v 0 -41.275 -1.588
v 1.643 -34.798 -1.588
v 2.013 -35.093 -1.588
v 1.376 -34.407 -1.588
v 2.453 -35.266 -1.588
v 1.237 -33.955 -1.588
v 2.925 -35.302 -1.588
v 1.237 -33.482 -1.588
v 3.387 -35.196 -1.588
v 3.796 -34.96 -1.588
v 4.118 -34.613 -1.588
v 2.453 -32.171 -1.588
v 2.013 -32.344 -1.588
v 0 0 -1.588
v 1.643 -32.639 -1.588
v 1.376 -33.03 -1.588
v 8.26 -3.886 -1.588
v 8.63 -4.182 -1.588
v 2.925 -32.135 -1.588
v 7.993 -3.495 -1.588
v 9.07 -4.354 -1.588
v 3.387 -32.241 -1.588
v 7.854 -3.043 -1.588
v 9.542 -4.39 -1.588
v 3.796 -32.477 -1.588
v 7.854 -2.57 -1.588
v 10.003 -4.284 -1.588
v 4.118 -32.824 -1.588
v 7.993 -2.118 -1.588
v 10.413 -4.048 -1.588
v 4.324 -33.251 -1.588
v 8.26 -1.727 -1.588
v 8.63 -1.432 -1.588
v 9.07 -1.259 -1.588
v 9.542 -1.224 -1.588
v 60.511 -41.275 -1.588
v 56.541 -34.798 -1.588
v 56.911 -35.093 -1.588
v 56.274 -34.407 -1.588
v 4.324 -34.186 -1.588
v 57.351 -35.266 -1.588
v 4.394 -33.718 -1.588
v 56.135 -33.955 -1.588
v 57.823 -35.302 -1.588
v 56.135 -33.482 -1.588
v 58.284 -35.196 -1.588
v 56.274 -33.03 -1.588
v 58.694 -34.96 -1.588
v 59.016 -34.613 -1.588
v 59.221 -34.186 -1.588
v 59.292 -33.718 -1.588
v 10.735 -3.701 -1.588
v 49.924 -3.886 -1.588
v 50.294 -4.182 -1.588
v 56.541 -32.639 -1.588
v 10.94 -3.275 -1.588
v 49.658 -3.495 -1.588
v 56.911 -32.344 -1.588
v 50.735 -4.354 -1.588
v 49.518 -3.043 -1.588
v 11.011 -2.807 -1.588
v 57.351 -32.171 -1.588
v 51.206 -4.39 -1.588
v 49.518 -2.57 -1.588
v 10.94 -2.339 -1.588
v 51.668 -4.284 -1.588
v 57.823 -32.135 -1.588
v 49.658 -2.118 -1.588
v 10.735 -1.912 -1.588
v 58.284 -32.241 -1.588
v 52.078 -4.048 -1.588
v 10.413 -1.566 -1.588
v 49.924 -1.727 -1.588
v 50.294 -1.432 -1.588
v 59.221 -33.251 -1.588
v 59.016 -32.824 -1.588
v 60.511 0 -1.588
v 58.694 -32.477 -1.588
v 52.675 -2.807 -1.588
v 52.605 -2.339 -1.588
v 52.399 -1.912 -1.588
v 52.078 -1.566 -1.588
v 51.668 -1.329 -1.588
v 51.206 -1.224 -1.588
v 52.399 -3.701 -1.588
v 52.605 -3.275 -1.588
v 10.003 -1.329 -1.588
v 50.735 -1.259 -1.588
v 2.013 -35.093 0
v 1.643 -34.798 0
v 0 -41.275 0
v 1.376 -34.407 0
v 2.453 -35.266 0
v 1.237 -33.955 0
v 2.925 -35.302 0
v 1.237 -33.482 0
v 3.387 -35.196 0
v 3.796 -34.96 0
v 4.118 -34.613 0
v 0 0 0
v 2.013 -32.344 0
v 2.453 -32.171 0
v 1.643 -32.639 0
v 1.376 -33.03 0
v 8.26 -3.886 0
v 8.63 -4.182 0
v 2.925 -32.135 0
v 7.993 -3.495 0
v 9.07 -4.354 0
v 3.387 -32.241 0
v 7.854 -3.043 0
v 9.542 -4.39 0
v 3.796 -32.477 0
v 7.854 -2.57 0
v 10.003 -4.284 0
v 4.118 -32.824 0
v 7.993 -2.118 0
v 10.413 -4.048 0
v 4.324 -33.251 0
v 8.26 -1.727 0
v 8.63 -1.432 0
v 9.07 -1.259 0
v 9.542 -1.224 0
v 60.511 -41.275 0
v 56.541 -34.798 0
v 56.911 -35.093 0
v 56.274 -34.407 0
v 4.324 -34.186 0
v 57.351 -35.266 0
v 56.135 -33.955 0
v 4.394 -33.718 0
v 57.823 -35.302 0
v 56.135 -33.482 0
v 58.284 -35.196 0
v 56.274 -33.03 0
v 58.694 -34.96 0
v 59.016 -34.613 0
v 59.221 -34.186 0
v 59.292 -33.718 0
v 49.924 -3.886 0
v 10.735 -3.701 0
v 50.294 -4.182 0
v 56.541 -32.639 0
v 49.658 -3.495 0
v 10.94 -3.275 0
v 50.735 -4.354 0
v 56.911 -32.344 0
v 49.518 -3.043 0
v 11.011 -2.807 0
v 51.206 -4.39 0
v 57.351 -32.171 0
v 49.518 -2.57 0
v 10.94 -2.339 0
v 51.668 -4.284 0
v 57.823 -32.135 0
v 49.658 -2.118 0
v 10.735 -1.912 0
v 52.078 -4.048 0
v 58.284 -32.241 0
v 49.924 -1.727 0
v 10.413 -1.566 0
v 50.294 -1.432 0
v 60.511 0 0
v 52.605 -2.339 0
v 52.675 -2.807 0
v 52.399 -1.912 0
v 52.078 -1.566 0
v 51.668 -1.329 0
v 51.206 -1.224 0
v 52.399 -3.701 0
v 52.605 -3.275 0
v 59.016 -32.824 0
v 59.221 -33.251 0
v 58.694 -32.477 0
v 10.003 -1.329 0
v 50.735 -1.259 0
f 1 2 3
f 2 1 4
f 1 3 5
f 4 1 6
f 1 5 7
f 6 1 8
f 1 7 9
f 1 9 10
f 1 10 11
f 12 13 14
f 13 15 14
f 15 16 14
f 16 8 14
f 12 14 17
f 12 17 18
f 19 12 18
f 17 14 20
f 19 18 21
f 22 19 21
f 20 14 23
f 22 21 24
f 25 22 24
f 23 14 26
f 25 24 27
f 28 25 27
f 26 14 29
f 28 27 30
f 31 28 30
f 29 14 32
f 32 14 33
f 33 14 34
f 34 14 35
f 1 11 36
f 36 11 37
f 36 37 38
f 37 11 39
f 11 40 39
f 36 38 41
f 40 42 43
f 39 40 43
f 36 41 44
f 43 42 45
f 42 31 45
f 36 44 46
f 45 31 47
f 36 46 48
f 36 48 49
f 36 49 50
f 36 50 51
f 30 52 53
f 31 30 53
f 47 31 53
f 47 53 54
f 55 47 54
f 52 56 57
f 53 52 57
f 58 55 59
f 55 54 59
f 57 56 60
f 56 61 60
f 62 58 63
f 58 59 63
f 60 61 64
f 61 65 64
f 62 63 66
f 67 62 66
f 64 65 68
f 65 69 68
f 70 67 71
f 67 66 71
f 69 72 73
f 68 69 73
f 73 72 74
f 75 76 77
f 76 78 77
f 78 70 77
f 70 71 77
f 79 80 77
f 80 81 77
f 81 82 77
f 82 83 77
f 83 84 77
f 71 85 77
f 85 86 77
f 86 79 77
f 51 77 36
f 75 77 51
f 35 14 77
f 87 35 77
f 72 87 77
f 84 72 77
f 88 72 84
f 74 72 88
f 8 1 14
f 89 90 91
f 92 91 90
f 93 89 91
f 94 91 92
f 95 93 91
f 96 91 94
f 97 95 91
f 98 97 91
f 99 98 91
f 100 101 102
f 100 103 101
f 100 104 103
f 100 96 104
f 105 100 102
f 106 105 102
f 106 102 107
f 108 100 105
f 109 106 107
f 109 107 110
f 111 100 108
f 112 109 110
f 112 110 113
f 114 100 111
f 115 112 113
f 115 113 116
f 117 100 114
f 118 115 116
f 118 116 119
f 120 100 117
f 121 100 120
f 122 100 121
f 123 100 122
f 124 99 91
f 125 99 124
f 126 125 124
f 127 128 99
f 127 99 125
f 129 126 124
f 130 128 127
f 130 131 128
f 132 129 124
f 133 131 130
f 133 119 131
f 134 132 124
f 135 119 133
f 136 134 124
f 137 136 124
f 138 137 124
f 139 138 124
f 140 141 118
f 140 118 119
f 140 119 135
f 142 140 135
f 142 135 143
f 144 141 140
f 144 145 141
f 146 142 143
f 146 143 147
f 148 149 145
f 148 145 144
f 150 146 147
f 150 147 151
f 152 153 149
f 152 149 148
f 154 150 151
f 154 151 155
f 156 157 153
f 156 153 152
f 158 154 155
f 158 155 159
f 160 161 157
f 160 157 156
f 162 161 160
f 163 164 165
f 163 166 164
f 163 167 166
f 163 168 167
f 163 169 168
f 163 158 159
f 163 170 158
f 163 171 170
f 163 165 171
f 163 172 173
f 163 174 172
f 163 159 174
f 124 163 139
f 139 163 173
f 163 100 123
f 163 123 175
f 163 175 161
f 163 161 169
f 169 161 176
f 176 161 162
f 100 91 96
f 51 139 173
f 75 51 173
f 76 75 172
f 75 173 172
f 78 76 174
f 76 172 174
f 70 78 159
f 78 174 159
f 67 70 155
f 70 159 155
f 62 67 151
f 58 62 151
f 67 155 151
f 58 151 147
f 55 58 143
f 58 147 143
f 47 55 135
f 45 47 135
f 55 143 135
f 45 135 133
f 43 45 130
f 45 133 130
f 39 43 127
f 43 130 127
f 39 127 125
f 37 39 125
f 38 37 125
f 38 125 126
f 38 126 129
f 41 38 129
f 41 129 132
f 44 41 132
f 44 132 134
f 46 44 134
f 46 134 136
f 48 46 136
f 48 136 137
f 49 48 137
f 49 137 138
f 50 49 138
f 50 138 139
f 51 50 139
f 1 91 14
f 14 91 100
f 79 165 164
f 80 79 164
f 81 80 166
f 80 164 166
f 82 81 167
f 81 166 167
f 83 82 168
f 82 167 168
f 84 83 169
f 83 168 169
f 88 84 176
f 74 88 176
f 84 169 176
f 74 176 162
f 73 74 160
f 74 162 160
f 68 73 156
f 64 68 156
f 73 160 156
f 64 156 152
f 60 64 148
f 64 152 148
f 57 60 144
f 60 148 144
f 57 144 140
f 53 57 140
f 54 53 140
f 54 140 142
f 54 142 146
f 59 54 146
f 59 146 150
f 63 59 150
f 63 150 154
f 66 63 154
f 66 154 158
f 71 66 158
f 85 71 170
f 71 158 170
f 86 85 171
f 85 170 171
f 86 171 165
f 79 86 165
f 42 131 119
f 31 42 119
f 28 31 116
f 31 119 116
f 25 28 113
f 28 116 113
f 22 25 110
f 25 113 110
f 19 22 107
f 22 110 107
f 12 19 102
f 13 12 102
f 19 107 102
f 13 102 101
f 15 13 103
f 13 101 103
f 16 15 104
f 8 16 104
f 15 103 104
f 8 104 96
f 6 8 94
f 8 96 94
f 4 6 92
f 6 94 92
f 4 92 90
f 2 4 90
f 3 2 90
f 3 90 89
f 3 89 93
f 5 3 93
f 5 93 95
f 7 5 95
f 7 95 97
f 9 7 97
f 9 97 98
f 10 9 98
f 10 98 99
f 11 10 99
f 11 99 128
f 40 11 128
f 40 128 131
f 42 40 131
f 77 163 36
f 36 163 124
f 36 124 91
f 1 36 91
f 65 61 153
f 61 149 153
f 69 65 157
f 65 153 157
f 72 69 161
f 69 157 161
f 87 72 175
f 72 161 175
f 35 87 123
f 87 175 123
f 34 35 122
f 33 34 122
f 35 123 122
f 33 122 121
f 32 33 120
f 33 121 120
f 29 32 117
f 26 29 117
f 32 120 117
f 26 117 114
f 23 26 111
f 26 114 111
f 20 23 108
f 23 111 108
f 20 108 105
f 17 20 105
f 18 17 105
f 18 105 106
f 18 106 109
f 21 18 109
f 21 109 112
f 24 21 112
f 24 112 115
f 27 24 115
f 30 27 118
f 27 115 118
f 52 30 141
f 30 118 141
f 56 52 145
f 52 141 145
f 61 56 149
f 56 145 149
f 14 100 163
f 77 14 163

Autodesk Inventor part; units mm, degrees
ref_plane "YZ Plane" through (0, 0, 0) normal (1, 0, 0) x (0, 1, 0)
ref_plane "XZ Plane" through (0, 0, 0) normal (0, 1, 0) x (-1, 0, 0)
ref_plane "XY Plane" through (0, 0, 0) normal (0, 0, 1) x (1, 0, 0)
sketch "Sketch1" plane through (0, 0, 0) normal (0, 0, 1) x (1, 0, 0)
  line L0 (0, 0) -> (60.5112, 0)
  line L1 (60.5112, 0) -> (60.5112, -41.275)
  line L2 (60.5112, -41.275) -> (0, -41.275)
  line L3 (0, -41.275) -> (0, 0)
  dimension "d0" = 41.275
  dimension "d1" = 60.5112
extrude "Extrusion1" add sketch "Sketch1" against normal blind 1.5875
sketch "Sketch2" plane through (0, 0, 0) normal (0, 0, 1) x (1, 0, 0)
  line L0 (0, 0) -> (60.5112, 0) projected
  line L1 (0, -41.275) -> (0, 0) projected
  line L2 (60.5112, -41.275) -> (0, -41.275) projected
  line L3 (60.5112, 0) -> (60.5112, -41.275) projected
  circle A0 centre (2.8067, -33.7185) radius 1.5875
  circle A1 centre (57.7045, -33.7185) radius 1.5875
  circle A2 centre (9.4234, -2.8067) radius 1.5875
  circle A3 centre (51.0878, -2.8067) radius 1.5875
  dimension "d13" = 3.175
  dimension "d14" = 2.8067
  dimension "d15" = 7.5565
  dimension "d16" = 3.175
  dimension "d17" = 7.5565
  dimension "d18" = 2.8067
  dimension "d19" = 3.175
  dimension "d20" = 9.4234
  dimension "d21" = 9.4234
  dimension "d22" = 3.175
  dimension "d23" = 2.8067
  dimension "d24" = 2.8067
extrude "Extrusion2" cut sketch "Sketch2" against normal blind 1.5875 contours A0 | A1 | A2 | A3
properties part number "Sensor Case Lid"
